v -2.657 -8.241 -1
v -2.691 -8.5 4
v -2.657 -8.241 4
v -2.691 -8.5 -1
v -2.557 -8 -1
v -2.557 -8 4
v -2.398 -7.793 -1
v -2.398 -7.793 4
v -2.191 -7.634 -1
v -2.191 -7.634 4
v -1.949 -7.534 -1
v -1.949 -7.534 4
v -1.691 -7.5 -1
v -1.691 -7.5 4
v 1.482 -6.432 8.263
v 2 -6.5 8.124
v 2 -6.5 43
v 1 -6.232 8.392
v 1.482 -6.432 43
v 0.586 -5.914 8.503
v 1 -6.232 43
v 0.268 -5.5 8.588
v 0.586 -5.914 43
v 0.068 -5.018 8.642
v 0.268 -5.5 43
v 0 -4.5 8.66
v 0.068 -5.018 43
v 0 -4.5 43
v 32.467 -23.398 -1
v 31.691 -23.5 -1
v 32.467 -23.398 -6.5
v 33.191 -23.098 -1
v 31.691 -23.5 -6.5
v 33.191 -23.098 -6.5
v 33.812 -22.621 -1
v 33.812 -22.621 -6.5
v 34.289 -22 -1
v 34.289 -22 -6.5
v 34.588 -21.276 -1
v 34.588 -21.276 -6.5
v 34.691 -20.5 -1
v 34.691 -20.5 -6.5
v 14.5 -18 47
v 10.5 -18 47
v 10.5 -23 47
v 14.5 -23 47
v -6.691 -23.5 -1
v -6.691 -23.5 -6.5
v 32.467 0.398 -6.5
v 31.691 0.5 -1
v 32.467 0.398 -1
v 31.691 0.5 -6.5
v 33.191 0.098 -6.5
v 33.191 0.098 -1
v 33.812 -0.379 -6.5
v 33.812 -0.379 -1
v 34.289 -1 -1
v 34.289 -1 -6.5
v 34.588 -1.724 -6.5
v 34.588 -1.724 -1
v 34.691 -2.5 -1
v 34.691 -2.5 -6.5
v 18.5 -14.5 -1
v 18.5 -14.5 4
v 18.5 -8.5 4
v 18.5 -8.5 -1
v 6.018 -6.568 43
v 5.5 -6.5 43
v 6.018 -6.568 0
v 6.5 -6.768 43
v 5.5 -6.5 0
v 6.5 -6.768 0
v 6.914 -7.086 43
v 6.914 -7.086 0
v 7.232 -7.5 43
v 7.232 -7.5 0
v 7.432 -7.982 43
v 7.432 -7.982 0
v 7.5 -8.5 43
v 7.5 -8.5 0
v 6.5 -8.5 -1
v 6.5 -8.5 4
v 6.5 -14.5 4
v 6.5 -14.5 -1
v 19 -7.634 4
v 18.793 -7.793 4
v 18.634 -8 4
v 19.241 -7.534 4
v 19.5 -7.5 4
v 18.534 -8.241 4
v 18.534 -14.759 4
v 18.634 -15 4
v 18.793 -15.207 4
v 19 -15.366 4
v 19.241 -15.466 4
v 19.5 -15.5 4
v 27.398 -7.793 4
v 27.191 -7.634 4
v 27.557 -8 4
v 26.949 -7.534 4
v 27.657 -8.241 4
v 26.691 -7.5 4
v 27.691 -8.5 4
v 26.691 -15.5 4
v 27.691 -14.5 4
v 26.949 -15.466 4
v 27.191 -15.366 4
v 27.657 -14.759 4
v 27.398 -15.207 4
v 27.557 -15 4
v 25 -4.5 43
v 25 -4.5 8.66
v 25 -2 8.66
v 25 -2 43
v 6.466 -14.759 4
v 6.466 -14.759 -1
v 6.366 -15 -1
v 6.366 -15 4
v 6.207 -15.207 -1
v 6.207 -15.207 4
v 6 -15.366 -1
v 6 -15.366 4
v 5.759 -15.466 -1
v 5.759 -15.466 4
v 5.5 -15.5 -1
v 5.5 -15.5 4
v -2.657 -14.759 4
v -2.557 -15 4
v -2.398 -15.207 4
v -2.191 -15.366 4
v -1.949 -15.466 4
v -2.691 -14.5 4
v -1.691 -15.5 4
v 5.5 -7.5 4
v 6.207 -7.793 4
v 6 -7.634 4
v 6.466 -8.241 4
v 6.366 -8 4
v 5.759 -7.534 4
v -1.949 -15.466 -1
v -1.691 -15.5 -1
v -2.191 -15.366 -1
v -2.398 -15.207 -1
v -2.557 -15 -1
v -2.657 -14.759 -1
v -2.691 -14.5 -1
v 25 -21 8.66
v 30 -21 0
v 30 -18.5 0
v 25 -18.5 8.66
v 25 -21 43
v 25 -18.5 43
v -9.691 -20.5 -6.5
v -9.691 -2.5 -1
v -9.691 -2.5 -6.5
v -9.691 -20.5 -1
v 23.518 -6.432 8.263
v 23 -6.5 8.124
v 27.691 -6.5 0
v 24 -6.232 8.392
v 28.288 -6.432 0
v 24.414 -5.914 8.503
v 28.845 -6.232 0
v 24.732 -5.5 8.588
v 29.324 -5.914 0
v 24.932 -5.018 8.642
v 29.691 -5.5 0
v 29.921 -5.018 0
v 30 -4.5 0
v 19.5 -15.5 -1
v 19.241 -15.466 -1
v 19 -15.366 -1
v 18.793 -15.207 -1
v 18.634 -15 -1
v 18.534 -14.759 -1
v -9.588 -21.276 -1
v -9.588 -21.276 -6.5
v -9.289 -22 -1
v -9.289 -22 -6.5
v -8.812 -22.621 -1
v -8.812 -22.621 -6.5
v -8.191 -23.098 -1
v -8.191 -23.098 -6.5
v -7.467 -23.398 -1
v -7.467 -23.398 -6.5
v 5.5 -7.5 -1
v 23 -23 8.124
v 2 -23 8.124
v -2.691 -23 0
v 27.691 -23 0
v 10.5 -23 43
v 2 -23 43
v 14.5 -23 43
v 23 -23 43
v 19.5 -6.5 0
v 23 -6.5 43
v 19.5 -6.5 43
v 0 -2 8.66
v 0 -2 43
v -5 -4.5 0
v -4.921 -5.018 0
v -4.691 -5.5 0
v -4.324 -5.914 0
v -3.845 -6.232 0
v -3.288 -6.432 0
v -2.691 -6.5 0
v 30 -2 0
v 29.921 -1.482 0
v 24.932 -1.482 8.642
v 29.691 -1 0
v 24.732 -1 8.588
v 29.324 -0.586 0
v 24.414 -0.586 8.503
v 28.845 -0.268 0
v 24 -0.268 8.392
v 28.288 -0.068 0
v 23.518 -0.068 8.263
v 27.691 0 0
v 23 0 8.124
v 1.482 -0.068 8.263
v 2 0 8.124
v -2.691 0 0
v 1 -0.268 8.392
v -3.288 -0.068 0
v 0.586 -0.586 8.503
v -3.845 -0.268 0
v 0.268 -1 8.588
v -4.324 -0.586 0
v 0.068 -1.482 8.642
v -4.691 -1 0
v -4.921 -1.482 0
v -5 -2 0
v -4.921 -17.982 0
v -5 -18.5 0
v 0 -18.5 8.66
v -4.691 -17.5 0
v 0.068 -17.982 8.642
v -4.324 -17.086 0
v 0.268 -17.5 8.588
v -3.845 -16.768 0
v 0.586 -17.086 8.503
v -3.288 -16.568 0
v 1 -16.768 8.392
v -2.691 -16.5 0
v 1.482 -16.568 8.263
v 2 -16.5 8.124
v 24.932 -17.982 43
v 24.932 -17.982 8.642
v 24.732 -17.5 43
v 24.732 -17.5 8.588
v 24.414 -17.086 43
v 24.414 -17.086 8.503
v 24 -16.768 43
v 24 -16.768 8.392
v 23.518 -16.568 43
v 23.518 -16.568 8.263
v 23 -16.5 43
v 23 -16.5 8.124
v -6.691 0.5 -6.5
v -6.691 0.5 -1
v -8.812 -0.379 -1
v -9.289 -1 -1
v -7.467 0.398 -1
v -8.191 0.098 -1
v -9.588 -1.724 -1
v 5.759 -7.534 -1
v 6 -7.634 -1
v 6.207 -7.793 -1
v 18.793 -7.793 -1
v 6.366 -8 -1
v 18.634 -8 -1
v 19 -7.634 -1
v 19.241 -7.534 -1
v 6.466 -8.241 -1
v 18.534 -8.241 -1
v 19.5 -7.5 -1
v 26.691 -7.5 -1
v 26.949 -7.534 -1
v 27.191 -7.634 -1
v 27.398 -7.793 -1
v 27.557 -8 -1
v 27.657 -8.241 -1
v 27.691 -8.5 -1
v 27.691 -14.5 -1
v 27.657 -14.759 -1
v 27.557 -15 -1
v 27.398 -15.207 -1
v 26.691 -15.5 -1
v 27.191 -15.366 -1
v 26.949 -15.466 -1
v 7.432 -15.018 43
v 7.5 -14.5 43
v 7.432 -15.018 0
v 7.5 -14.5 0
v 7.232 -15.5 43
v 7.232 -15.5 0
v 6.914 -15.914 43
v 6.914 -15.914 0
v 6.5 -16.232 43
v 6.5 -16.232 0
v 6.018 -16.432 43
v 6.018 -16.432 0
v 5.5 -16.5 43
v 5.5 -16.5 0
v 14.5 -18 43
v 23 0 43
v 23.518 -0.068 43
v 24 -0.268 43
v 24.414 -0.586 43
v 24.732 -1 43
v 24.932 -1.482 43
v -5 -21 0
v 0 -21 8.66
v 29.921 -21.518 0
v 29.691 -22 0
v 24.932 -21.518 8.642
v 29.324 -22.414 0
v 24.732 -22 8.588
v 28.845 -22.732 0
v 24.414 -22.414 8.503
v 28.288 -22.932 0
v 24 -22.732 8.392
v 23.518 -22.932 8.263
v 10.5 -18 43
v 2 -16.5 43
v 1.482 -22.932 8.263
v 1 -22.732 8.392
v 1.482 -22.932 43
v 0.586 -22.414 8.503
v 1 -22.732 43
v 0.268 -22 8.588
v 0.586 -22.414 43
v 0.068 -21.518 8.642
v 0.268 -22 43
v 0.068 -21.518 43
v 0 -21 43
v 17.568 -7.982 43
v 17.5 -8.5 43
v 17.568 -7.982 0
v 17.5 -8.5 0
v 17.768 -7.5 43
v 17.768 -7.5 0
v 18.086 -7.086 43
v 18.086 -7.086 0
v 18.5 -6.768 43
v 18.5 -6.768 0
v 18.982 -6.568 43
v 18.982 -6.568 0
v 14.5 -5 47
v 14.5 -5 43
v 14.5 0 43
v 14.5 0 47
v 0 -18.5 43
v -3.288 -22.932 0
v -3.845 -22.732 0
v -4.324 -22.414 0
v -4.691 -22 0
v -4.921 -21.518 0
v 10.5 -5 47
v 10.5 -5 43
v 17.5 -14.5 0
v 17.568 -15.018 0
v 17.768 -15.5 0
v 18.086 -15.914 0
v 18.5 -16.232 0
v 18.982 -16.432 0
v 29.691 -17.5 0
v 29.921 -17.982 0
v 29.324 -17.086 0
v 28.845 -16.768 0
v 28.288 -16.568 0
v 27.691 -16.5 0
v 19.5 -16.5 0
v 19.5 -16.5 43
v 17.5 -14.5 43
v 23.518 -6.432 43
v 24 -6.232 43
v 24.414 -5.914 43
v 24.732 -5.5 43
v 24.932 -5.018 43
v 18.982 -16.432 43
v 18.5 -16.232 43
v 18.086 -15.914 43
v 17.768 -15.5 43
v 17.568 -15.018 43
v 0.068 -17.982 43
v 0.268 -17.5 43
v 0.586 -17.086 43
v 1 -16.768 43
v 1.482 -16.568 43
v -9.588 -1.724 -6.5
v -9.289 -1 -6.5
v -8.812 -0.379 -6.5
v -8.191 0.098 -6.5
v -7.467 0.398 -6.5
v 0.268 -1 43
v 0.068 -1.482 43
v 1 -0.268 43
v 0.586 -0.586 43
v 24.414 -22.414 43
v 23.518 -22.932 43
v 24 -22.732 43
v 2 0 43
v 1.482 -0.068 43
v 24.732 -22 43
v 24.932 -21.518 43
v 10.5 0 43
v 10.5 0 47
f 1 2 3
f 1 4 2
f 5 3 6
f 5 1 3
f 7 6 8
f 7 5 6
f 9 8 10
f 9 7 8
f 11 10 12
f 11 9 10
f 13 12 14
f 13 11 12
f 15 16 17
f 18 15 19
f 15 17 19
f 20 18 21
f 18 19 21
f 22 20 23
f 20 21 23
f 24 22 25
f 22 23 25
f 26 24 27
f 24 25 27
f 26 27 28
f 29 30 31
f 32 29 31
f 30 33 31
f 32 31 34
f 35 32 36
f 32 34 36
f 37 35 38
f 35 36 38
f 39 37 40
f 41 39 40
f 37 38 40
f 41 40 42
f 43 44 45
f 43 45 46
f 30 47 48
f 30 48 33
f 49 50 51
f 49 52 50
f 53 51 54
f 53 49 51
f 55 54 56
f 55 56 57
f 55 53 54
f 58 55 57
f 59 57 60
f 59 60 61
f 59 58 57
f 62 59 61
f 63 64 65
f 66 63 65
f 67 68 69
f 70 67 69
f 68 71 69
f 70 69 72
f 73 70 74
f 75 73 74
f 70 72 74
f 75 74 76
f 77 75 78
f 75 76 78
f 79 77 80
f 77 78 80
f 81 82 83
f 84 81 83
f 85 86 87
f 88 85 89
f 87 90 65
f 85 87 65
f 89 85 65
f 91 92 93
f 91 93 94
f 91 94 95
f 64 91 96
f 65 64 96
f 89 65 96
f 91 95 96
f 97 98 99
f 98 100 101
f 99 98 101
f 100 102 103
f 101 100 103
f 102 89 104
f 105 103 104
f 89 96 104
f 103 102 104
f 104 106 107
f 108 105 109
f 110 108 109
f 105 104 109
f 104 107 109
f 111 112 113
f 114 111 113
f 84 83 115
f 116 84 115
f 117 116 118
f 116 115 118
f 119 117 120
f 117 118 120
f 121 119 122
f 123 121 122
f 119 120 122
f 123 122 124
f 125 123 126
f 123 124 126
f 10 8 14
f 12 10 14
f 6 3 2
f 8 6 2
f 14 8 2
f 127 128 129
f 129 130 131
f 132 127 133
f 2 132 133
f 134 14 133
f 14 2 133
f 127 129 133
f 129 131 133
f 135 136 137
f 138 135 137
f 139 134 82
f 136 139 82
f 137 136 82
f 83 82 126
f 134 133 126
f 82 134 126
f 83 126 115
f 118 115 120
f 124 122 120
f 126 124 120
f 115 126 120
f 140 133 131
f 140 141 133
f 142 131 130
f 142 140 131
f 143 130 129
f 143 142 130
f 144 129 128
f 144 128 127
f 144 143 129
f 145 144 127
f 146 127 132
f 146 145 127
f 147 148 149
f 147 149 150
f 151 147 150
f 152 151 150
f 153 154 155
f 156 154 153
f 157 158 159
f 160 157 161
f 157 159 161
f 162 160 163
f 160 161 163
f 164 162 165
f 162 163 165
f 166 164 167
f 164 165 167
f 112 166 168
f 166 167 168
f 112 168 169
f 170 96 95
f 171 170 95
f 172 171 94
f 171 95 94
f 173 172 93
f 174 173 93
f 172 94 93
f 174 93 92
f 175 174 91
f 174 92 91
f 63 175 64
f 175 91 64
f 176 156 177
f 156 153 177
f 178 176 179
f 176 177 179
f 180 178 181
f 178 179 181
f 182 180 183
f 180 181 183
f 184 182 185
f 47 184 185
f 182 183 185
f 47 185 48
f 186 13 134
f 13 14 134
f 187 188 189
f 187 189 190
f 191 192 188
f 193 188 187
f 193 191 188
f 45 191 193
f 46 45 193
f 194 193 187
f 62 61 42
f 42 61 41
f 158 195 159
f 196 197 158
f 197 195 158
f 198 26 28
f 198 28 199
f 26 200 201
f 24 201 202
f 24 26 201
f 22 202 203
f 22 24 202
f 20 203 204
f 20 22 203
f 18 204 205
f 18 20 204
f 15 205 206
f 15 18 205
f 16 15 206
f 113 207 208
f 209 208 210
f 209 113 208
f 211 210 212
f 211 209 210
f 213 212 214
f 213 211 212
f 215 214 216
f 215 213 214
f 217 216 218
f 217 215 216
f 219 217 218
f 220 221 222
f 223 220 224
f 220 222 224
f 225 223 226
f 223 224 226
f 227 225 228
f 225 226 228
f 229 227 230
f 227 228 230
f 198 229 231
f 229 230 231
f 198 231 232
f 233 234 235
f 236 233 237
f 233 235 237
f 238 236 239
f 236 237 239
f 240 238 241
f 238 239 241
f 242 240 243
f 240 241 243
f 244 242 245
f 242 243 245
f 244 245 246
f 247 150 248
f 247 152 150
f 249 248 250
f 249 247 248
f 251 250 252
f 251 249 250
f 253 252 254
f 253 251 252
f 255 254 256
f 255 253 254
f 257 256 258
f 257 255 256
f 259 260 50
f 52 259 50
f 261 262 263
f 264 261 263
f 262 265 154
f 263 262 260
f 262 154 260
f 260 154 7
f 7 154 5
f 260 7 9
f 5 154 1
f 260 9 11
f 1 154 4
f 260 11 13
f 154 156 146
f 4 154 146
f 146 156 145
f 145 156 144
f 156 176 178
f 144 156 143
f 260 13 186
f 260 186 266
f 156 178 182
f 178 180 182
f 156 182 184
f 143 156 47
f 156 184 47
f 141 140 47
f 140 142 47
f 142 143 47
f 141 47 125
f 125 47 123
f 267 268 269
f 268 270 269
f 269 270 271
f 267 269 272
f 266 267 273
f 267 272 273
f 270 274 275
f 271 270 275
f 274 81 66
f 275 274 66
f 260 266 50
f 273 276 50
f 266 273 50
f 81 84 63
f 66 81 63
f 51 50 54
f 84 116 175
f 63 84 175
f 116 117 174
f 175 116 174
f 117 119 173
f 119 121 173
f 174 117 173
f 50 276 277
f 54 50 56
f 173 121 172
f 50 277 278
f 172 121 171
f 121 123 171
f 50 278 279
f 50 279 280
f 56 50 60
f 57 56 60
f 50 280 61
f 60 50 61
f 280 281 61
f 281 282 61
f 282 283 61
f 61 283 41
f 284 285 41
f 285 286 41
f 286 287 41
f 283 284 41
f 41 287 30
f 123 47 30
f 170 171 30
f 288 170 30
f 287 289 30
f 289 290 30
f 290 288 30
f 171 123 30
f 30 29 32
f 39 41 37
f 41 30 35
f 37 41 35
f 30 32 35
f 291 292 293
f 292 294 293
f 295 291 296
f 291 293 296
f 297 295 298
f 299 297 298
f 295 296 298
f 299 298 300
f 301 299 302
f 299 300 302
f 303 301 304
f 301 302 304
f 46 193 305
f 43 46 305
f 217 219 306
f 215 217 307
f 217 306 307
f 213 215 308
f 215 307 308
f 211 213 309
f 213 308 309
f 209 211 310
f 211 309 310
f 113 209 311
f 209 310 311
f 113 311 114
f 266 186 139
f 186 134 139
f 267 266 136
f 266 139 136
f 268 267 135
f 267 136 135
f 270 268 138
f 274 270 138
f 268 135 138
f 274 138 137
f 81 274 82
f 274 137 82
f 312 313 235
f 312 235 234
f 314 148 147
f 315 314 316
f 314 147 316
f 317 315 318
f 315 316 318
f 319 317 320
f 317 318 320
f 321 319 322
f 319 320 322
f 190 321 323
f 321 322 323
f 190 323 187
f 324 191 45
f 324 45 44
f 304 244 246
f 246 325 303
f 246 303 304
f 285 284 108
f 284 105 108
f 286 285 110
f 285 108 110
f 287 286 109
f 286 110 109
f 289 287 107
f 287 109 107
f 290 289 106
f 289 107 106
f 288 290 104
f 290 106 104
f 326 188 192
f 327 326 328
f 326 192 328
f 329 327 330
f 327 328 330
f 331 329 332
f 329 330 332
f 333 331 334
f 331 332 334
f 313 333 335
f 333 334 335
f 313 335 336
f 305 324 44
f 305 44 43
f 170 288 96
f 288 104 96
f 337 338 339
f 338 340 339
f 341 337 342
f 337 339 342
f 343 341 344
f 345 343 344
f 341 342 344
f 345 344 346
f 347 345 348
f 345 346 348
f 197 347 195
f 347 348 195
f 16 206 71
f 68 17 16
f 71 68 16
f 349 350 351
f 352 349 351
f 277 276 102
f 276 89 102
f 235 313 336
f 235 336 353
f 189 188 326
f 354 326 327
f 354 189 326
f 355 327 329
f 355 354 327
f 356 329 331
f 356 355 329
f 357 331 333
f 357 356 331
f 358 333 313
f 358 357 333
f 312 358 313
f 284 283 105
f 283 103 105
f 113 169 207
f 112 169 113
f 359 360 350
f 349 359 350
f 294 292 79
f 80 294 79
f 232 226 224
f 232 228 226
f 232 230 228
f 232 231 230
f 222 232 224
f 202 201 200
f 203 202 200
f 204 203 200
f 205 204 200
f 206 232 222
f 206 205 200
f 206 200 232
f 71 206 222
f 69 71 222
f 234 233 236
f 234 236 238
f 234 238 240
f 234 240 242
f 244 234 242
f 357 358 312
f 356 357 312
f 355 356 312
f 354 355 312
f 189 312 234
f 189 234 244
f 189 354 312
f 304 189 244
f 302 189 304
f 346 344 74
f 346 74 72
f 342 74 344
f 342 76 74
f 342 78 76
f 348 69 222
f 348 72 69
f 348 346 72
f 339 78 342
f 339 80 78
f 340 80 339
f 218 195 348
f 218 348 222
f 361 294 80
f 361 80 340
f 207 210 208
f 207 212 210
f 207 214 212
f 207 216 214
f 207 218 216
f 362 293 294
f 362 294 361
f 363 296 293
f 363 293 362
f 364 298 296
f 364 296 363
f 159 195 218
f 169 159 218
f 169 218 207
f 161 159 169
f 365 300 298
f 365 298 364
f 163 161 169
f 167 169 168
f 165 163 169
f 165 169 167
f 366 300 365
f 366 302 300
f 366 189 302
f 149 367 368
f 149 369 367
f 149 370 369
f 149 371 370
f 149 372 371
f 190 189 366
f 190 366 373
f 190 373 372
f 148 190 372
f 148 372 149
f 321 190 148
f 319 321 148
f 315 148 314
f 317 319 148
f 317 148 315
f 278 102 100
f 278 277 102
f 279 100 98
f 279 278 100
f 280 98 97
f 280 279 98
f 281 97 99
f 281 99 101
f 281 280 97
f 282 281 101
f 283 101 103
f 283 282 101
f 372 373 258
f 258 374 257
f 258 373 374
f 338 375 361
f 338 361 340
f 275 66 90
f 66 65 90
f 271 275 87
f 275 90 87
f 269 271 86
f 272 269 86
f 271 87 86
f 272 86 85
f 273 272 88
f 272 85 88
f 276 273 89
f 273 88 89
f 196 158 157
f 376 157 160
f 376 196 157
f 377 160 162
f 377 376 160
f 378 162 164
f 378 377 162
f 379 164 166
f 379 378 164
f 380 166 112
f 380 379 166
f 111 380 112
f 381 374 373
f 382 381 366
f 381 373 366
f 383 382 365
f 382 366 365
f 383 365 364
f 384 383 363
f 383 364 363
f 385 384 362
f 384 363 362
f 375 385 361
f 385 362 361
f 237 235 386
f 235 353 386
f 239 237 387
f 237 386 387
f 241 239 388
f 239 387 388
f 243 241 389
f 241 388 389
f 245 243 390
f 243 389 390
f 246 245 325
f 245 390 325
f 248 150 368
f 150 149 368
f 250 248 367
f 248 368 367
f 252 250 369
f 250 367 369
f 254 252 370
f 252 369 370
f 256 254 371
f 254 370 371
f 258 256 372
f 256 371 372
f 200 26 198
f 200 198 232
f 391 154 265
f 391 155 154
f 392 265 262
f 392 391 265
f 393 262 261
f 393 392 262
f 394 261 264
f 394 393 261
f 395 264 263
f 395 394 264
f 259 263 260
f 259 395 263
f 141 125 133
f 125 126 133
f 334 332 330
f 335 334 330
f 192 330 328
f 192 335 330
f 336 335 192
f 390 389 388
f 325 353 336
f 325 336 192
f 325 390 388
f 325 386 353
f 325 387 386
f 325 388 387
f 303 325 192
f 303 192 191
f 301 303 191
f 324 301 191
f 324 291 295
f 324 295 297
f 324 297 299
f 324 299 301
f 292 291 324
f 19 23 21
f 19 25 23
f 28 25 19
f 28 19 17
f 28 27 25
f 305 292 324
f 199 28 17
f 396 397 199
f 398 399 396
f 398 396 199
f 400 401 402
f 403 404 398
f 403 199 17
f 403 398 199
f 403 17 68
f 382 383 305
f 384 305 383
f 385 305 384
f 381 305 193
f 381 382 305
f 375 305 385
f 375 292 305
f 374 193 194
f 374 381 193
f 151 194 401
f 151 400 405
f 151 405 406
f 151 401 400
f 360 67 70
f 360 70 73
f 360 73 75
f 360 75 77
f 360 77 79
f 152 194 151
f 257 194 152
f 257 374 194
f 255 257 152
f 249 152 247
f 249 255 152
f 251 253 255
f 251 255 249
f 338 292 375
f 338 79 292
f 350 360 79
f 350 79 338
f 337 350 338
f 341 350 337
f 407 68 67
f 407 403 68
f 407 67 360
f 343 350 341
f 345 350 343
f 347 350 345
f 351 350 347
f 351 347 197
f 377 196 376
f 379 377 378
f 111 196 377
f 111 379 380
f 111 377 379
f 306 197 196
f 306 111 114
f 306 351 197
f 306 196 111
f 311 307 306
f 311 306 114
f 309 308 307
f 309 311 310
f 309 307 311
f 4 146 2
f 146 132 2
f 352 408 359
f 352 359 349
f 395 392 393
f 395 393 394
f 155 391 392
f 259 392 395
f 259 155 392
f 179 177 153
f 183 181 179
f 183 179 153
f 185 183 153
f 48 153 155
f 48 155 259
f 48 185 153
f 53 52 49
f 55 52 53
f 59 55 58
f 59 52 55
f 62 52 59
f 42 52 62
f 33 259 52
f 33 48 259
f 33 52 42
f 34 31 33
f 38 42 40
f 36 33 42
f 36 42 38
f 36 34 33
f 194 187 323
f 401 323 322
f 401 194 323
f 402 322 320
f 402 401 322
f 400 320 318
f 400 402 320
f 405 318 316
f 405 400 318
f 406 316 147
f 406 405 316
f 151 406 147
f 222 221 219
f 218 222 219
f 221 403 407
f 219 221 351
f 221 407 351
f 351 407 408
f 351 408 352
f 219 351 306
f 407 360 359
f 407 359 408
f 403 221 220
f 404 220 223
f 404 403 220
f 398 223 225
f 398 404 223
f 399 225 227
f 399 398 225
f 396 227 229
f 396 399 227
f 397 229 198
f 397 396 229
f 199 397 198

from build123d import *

# Parameters (mm, degrees)
F0_W           = 25
F0_H           = 23
F1_DEPTH       = 43
F2_W           = 4
F2_H           = 5
F3_DEPTH       = 4
F5_DEPTH       = 23
F6_W           = 15
F6_H           = 10
F7_DEPTH       = 43.001
F8_R           = 2
F10_DEPTH      = 4
F10_DEPTH_BACK = 1
F11_W          = 44.3811978465
F11_H          = 24
F12_DEPTH      = 5.5
F13_R          = 3
F14_R          = 1


with BuildPart() as f1:
    # F0 (on Top) → F1 (new body)
    with BuildSketch(Plane.XY):
        with Locations((12.5, -11.5)):
            Rectangle(F0_W, F0_H)
    extrude(amount=F1_DEPTH)

    # F2 (on face) → F3 (join)
    with BuildSketch(Plane.XY.offset(43)):
        with Locations((12.5, -2.5)):
            Rectangle(F2_W, F2_H)
        with Locations((12.5, -20.5)):
            Rectangle(F2_W, F2_H)
    extrude(amount=F3_DEPTH)

    # F4 (on face) → F5 (join)
    with BuildSketch(Plane.XZ.offset(23)):
        Polygon((30, 0), (25, 8.6602540378), (25, 0), align=None)
        Polygon((0, 0), (0, 8.6602540378), (-5, 0), align=None)
    extrude(amount=-F5_DEPTH)

    # F6 (on face) → F7 (cut, through all)
    with BuildSketch(Plane.XY.offset(43)):
        with Locations((0, -11.5)):
            Rectangle(F6_W, F6_H)
        with Locations((25, -11.5)):
            Rectangle(F6_W, F6_H)
    extrude(amount=-F7_DEPTH, mode=Mode.SUBTRACT)

    # F8
    f8_edges = [f1.edges().sort_by_distance(p)[0] for p in [
        (25, -23, 25.830127),
        (27.5, -23, 4.330127),
        (0, -23, 25.830127),
        (0, -16.5, 25.830127),
        (-2.5, -23, 4.330127),
        (-2.5, -16.5, 4.330127),
        (7.5, -16.5, 21.5),
        (7.5, -6.5, 21.5),
        (0, -6.5, 25.830127),
        (-2.5, -6.5, 4.330127),
        (0, 0, 25.830127),
        (-2.5, 0, 4.330127),
        (17.5, -16.5, 21.5),
        (25, -16.5, 25.830127),
        (27.5, -16.5, 4.330127),
        (27.5, 0, 4.330127),
        (25, 0, 25.830127),
        (17.5, -6.5, 21.5),
        (25, -6.5, 25.830127),
        (27.5, -6.5, 4.330127),
    ]]
    fillet(f8_edges, radius=F8_R)


with BuildPart() as f10:
    # F9 (on face) → F10 (new body, two sides)
    with BuildSketch(Plane(origin=(0, 0, 0), x_dir=(1, 0, 0), z_dir=(0, 0, -1))) as f10_sk:
        with BuildLine():
            Line((5.5, 15.5), (-2.6905989232, 15.5))
            Line((-2.6905989232, 15.5), (-2.6905989232, 7.5))
            Line((-2.6905989232, 7.5), (5.5, 7.5))
            ThreePointArc((5.5, 7.5), (6.2071067812, 7.7928932188), (6.5, 8.5))
            Line((6.5, 8.5), (6.5, 14.5))
            ThreePointArc((6.5, 14.5), (6.2071067812, 15.2071067812), (5.5, 15.5))
        make_face()
    extrude(amount=-F10_DEPTH)
    extrude(f10_sk.sketch, amount=F10_DEPTH_BACK)



with BuildPart() as f10b:
    # F9 (on face) → F10, piece 2 (new body, two sides)
    with BuildSketch(Plane(origin=(0, 0, 0), x_dir=(1, 0, 0), z_dir=(0, 0, -1))) as f10_2_sk:
        with BuildLine():
            Line((18.5, 14.5), (18.5, 8.5))
            ThreePointArc((18.5, 8.5), (18.7928932188, 7.7928932188), (19.5, 7.5))
            Line((19.5, 7.5), (27.6905989232, 7.5))
            Line((27.6905989232, 7.5), (27.6905989232, 15.5))
            Line((27.6905989232, 15.5), (19.5, 15.5))
            ThreePointArc((19.5, 15.5), (18.7928932188, 15.2071067812), (18.5, 14.5))
        make_face()
    extrude(amount=-F10_DEPTH)
    extrude(f10_2_sk.sketch, amount=F10_DEPTH_BACK)


with BuildPart() as f10_1:
    add(f10.part)

    add(f10b.part)  # F12 merges F10b
    # F11 (on face) → F12 (join)
    with BuildSketch(Plane(origin=(0, 0, -1), x_dir=(1, 0, 0), z_dir=(0, 0, -1))):
        with Locations((12.5, 11.5)):
            Rectangle(F11_W, F11_H)
    extrude(amount=F12_DEPTH)

    # F13
    f13_edges = [f10_1.edges().sort_by_distance(p)[0] for p in [
        (34.690599, -23.5, -3.75),
        (-9.690599, -23.5, -3.75),
        (-9.690599, 0.5, -3.75),
        (34.690599, 0.5, -3.75),
    ]]
    fillet(f13_edges, radius=F13_R)

    # F14
    f14_edges = [f10_1.edges().sort_by_distance(p)[0] for p in [
        (27.690599, -15.5, 1.5),
        (27.690599, -7.5, 1.5),
        (-2.690599, -7.5, 1.5),
        (-2.690599, -15.5, 1.5),
    ]]
    fillet(f14_edges, radius=F14_R)


solid = Compound([f1.part, f10_1.part])
